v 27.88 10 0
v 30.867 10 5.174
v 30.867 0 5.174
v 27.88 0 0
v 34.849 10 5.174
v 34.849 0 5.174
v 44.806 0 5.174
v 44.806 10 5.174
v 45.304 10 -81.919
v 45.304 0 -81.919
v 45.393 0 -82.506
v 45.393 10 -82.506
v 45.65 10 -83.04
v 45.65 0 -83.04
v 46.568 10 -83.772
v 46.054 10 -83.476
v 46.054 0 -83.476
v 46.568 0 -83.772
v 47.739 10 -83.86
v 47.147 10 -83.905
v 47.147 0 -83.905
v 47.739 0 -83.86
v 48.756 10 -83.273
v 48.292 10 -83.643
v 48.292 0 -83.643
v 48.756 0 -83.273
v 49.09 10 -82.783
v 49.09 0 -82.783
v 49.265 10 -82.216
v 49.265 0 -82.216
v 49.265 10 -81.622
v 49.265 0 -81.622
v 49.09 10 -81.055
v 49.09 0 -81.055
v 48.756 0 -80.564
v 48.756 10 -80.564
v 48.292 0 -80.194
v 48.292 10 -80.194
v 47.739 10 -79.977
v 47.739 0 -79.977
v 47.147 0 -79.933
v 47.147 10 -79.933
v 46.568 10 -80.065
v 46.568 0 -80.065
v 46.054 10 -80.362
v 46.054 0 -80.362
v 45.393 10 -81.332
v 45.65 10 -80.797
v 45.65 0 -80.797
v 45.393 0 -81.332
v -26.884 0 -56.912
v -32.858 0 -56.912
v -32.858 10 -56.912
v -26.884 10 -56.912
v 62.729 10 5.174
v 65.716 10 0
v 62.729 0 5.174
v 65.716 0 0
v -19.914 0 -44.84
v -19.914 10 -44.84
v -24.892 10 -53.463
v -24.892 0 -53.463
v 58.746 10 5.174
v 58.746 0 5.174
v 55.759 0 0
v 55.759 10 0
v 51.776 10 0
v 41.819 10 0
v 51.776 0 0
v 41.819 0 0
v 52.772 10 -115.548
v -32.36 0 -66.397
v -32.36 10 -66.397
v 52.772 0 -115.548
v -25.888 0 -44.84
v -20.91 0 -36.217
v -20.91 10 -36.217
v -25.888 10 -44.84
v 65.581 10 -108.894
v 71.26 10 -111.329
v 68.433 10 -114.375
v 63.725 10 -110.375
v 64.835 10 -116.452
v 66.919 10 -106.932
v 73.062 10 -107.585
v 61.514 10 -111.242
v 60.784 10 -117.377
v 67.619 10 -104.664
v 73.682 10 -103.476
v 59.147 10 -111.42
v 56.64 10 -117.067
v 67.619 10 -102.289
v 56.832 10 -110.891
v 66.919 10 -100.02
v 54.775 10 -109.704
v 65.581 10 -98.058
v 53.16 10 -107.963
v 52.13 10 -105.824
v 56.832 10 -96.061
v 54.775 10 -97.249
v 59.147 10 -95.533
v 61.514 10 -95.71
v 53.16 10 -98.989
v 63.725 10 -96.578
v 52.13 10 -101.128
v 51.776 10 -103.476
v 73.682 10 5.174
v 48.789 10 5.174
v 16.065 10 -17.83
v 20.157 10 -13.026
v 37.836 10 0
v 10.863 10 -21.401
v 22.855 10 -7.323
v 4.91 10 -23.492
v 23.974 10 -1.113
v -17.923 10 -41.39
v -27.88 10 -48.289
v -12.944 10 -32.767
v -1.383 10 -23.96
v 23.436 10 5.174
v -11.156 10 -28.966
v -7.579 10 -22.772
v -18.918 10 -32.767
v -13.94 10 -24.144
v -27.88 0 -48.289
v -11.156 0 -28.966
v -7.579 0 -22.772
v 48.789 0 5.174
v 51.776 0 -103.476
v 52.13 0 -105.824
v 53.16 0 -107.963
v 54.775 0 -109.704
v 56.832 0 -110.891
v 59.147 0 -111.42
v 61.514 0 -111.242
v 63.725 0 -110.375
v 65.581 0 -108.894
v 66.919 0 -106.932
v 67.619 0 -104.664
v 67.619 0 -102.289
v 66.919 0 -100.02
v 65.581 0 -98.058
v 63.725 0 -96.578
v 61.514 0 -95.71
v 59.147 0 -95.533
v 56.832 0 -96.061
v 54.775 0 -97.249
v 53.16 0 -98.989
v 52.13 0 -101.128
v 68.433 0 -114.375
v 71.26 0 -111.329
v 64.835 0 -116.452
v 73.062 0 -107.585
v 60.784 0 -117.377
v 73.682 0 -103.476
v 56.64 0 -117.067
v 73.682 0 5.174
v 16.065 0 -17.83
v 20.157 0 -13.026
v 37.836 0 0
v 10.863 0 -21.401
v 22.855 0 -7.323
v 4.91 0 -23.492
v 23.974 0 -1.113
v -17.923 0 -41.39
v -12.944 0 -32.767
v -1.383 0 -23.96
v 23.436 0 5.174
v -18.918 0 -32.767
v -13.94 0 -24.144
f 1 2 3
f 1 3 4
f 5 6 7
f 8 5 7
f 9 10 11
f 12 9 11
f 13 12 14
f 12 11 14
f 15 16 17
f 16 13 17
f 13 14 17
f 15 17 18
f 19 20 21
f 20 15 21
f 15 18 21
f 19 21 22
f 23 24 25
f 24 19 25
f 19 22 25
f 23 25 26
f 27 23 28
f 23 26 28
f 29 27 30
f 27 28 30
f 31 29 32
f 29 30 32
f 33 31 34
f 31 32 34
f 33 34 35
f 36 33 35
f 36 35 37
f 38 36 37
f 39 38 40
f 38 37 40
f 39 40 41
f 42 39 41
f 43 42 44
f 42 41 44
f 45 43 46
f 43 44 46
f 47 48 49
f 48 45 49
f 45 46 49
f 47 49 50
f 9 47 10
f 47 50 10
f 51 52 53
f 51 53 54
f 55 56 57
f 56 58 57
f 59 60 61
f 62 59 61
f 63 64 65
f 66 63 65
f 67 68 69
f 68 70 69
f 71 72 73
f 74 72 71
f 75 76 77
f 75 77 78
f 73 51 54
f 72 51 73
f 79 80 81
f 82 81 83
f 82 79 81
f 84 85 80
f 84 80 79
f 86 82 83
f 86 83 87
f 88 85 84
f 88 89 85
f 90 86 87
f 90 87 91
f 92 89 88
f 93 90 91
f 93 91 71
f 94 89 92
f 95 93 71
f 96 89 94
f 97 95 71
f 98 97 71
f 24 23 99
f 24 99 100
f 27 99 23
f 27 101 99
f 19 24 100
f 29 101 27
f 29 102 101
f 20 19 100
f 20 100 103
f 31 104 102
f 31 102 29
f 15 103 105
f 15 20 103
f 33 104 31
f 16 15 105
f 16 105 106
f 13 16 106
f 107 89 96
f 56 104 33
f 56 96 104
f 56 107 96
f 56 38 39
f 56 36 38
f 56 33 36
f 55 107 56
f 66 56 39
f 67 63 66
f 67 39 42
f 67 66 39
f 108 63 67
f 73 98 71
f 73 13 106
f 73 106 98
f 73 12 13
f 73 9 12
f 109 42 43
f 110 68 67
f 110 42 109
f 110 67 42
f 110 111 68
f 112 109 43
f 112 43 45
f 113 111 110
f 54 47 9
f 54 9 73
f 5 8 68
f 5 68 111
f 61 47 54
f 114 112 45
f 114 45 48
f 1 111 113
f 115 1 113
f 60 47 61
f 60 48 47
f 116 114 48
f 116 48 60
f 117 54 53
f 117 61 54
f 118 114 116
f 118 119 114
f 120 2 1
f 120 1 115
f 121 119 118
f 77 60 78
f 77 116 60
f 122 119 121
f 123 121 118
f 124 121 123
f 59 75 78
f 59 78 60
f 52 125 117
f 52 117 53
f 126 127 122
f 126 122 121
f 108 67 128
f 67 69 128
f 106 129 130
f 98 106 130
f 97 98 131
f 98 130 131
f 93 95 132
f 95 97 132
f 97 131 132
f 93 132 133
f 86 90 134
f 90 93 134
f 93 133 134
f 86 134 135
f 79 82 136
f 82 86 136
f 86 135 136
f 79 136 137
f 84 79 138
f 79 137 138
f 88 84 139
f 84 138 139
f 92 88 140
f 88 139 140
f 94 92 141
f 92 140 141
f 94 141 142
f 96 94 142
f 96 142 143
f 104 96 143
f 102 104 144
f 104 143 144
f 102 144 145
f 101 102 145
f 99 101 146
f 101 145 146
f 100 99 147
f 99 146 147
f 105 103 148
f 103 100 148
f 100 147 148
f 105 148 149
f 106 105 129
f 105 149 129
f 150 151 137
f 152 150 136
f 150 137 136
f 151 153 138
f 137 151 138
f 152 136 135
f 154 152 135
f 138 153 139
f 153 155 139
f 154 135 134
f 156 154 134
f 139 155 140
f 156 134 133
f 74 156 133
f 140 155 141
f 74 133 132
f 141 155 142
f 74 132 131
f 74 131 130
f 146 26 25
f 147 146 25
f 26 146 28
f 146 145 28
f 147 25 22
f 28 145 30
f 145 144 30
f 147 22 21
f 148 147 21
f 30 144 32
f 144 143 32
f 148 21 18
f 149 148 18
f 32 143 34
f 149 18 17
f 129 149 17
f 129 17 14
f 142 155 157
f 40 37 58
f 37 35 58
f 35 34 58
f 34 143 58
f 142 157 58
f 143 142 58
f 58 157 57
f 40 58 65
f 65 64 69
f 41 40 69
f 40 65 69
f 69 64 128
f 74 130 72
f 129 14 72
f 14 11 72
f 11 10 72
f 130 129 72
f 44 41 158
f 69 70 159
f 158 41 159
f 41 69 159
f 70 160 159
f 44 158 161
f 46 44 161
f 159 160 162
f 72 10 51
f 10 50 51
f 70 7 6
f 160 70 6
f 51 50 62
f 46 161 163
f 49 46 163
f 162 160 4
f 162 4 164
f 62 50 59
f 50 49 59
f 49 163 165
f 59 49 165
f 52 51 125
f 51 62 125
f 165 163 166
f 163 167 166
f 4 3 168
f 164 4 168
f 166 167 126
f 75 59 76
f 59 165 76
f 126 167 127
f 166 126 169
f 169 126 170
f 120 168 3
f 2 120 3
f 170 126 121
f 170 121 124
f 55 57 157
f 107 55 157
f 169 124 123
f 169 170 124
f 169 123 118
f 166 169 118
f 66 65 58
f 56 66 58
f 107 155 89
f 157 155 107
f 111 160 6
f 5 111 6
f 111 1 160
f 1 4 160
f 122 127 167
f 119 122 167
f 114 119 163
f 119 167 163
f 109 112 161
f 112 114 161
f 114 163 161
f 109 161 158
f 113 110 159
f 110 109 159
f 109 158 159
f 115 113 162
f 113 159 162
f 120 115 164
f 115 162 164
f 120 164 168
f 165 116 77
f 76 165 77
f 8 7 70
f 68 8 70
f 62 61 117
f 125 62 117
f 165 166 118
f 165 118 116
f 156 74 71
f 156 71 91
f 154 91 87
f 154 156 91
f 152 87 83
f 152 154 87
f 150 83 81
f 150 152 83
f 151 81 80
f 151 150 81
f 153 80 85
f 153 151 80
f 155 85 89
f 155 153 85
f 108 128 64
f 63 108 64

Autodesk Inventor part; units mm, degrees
ref_plane "YZ Plane" through (0, 0, 0) normal (1, 0, 0) x (0, 1, 0)
ref_plane "XZ Plane" through (0, 0, 0) normal (0, 1, 0) x (-1, 0, 0)
ref_plane "XY Plane" through (0, 0, 0) normal (0, 0, 1) x (1, 0, 0)
sketch "Boceto1" plane through (0, 0, 0) normal (0, 1, 0) x (-1, 0, 0)
  circle A0 centre (-59.7419, -103.4763) radius 7.9656
  circle A1 centre (-47.2958, -81.9187) radius 1.9914
  line L0 (-73.6817, -103.4763) -> (-73.6817, 5.1739)
  line L1 (32.3603, -66.3972) -> (-52.772, -115.5485)
  arc A2 (-73.6817, -103.4763) -> (-52.772, -115.5485) centre (-59.7419, -103.4763) ccw
  line L2 (13.9398, -24.1443) -> (18.9183, -32.7673)
  line L3 (20.9097, -36.2166) -> (25.8882, -44.8396)
  line L4 (27.8796, -48.2888) -> (32.8581, -56.9118)
  line L5 (7.5794, -22.7716) -> (11.1559, -28.9662)
  line L6 (11.1559, -28.9662) -> (13.9398, -24.1443)
  line L7 (13.9398, -24.1443) -> (18.9183, -32.7673)
  line L8 (18.9183, -32.7673) -> (12.9441, -32.7673)
  line L9 (12.9441, -32.7673) -> (17.9226, -41.3904)
  line L10 (17.9226, -41.3904) -> (20.9097, -36.2166)
  line L11 (20.9097, -36.2166) -> (25.8882, -44.8396)
  line L12 (25.8882, -44.8396) -> (19.914, -44.8396)
  line L13 (19.914, -44.8396) -> (24.8925, -53.4626)
  line L14 (24.8925, -53.4626) -> (27.8796, -48.2888)
  line L15 (27.8796, -48.2888) -> (32.8581, -56.9118)
  line L16 (32.8581, -56.9118) -> (26.8839, -56.9118)
  line L17 (26.8839, -56.9118) -> (32.3603, -66.3972)
  line L18 (-27.8795, 0.0001) -> (-37.8365, 0.0001)
  line L19 (-41.8193, 0.0001) -> (-51.7763, 0.0001)
  line L20 (-55.7591, 0.0001) -> (-65.7161, 0.0001)
  line L21 (-23.4355, 5.1739) -> (-30.8666, 5.1739)
  line L22 (-30.8666, 5.1739) -> (-27.8795, 0.0001)
  line L23 (-27.8795, 0.0001) -> (-37.8365, 0.0001)
  line L24 (-37.8365, 0.0001) -> (-34.8494, 5.1739)
  line L25 (-34.8494, 5.1739) -> (-44.8064, 5.1739)
  line L26 (-44.8064, 5.1739) -> (-41.8193, 0.0001)
  line L27 (-41.8193, 0.0001) -> (-51.7763, 0.0001)
  line L28 (-51.7763, 0.0001) -> (-48.7892, 5.1739)
  line L29 (-48.7892, 5.1739) -> (-58.7462, 5.1739)
  line L30 (-58.7462, 5.1739) -> (-55.7591, 0.0001)
  line L31 (-55.7591, 0.0001) -> (-65.7161, 0.0001)
  line L32 (-65.7161, 0.0001) -> (-62.729, 5.1739)
  line L33 (-62.729, 5.1739) -> (-73.6817, 5.1739)
  arc A3 (-23.4355, 5.1739) -> (7.5794, -22.7716) centre (0, 0) ccw
extrude "Extrusión2" add sketch "Boceto1" along normal blind 10
sketch "Boceto2" plane through (0, 10, 0) normal (0, 1, 0) x (1, 0, 0)
  circle A0 centre (59.7419, 103.4763) radius 7.9656 projected
  circle A1 centre (47.2958, 81.9187) radius 1.9914 projected
  arc A2 (73.6817, 103.4763) -> (52.772, 115.5485) centre (59.7419, 103.4763) ccw projected
  line L0 (52.772, 115.5485) -> (-32.3603, 66.3972) projected
  line L1 (-32.3603, 66.3972) -> (-26.8839, 56.9118) projected
  line L2 (-26.8839, 56.9118) -> (-32.8581, 56.9118) projected
  line L3 (-32.8581, 56.9118) -> (-27.8796, 48.2888) projected
  line L4 (-27.8796, 48.2888) -> (-24.8925, 53.4626) projected
  line L5 (-24.8925, 53.4626) -> (-19.914, 44.8396) projected
  line L6 (-19.914, 44.8396) -> (-25.8882, 44.8396) projected
  line L7 (-25.8882, 44.8396) -> (-20.9097, 36.2166) projected
  line L8 (-20.9097, 36.2166) -> (-17.9226, 41.3904) projected
  line L9 (-17.9226, 41.3904) -> (-12.9441, 32.7673) projected
  line L10 (-12.9441, 32.7673) -> (-18.9183, 32.7673) projected
  line L11 (-18.9183, 32.7673) -> (-13.9398, 24.1443) projected
  line L12 (-13.9398, 24.1443) -> (-11.1559, 28.9662) projected
  line L13 (-11.1559, 28.9662) -> (-7.5794, 22.7716) projected
  arc A3 (23.4355, -5.1739) -> (-7.5794, 22.7716) centre (0, 0) ccw projected
  line L14 (23.4355, -5.1739) -> (30.8666, -5.1739) projected
  line L15 (30.8666, -5.1739) -> (27.8795, -0.0001) projected
  line L16 (27.8795, -0.0001) -> (37.8365, -0.0001) projected
  line L17 (37.8365, -0.0001) -> (34.8494, -5.1739) projected
  line L18 (34.8494, -5.1739) -> (44.8064, -5.1739) projected
  line L19 (44.8064, -5.1739) -> (41.8193, -0.0001) projected
  line L20 (41.8193, -0.0001) -> (51.7763, -0.0001) projected
  line L21 (51.7763, -0.0001) -> (48.7892, -5.1739) projected
  line L22 (48.7892, -5.1739) -> (58.7462, -5.1739) projected
  line L23 (58.7462, -5.1739) -> (55.7591, -0.0001) projected
  line L24 (55.7591, -0.0001) -> (65.7161, -0.0001) projected
  line L25 (65.7161, -0.0001) -> (62.729, -5.1739) projected
  line L26 (62.729, -5.1739) -> (73.6817, -5.1739) projected
  line L27 (73.6817, -5.1739) -> (73.6817, 103.4763) projected
  line L28 (-2.0722, 33.9367) -> (-18.7001, 62.7369)
  line L29 (-18.7001, 62.7369) -> (29.3976, 90.5062)
  circle A4 centre (47.2958, 81.9187) radius 1.9914 projected
  line L30 (52.772, 115.5485) -> (-32.3603, 66.3972) projected
  arc A5 (12.4849, 31.6246) -> (-2.0722, 33.9367) centre (0, 0) ccw
  circle A6 centre (59.7419, 103.4763) radius 7.9656 projected
  arc A7 (29.3976, 90.5062) -> (39.1023, 77.7274) centre (59.7419, 103.4763) ccw
  line L31 (12.4849, 31.6246) -> (39.1023, 77.7274)
  line L32 (0, 0) -> (59.7419, 103.4763)
  line L33 (32.4961, 9.9999) -> (63.6817, 9.9999)
  line L34 (63.6817, 9.9999) -> (63.6817, 70.7123)
  line L35 (21.1452, 26.6246) -> (47.7626, 72.7274)
  arc A8 (47.7626, 72.7274) -> (63.6817, 70.7123) centre (59.7419, 103.4763) ccw
  arc A9 (32.4961, 9.9999) -> (21.1452, 26.6246) centre (0, 0) ccw
  line L36 (41.8193, -0.0001) -> (51.7763, -0.0001) projected
  line L37 (73.6817, -5.1739) -> (73.6817, 103.4763) projected
  dimension "d6" = 10
  dimension "d8" = 10
  dimension "d10" = 33
  dimension "d11" = 5
  dimension "d12" = 10
  dimension "d13" = 10
  dimension "d14" = 10
  dimension "d15" = 10
  dimension "d16" = 33
  dimension "d17" = 5
